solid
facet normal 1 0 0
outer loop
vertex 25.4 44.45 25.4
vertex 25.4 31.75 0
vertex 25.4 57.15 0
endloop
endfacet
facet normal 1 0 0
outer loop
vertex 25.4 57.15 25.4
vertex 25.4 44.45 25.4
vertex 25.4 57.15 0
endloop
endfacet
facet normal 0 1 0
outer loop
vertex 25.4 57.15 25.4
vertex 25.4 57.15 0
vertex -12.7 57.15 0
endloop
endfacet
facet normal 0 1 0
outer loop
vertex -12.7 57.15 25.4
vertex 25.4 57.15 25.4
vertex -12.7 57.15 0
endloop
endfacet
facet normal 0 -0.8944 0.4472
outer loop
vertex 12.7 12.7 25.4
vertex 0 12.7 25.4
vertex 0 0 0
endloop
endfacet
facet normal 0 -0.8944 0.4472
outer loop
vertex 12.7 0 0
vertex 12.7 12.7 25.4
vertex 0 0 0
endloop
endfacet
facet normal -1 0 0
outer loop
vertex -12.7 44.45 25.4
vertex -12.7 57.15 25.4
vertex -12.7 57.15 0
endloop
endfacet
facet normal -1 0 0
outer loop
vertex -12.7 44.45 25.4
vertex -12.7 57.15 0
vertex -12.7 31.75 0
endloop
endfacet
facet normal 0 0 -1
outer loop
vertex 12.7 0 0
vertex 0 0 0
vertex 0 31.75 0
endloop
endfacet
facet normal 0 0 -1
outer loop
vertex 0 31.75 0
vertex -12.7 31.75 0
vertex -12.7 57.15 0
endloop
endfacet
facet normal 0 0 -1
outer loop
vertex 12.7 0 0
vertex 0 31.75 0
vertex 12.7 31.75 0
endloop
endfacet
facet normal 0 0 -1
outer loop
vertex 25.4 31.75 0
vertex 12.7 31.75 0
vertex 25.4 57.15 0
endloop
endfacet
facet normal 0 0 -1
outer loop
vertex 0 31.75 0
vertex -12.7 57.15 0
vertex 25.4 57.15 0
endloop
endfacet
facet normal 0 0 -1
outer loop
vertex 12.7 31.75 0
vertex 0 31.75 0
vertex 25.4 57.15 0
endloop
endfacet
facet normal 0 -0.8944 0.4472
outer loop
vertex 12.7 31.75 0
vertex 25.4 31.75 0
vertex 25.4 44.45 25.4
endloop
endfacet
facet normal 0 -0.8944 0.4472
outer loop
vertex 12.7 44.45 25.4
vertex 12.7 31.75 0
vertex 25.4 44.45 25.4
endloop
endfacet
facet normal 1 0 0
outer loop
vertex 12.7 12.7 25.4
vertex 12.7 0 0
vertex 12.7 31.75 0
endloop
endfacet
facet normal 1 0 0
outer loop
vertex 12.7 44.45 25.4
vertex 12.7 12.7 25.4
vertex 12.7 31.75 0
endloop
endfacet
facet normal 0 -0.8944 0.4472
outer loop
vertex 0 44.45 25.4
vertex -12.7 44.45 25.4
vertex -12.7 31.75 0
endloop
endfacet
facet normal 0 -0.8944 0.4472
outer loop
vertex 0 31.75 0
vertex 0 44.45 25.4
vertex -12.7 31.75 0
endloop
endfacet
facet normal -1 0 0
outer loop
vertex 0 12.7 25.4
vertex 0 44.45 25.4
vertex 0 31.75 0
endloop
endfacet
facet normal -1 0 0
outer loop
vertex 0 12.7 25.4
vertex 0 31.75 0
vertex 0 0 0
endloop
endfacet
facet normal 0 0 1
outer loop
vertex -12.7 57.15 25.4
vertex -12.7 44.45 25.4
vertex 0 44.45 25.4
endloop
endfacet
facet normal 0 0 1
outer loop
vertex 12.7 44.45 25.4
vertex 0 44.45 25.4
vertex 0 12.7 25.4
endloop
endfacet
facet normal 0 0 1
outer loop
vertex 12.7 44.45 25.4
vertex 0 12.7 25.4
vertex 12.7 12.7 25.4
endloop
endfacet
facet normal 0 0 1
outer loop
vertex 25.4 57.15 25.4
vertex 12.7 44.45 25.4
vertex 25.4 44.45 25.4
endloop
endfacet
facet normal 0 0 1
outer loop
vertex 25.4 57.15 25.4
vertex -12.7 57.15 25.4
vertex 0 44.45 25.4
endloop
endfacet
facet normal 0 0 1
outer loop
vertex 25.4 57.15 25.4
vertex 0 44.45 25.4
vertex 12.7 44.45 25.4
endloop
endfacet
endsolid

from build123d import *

# Parameters (mm, degrees)
F1_DEPTH = 25.4
F3_DEPTH = 12.7
F5_DEPTH = 12.7
F7_DEPTH = 12.7


with BuildPart() as f1:
    # F0 (on Top) → F1 (new body)
    with BuildSketch(Plane.XY):
        Polygon((-12.7, 31.75), (0, 31.75), (0, 0), (12.7, 0), (12.7, 31.75), (25.4, 31.75), (25.4, 57.15), (-12.7, 57.15), align=None)
    extrude(amount=F1_DEPTH)

    # F2 (on face) → F3 (cut)
    with BuildSketch(Plane(origin=(-12.7, 0, 0), x_dir=(0, -1, 0), z_dir=(-1, 0, 0))):
        Polygon((-31.75, 25.4), (-44.45, 25.4), (-31.75, 0), align=None)
    extrude(amount=-F3_DEPTH, mode=Mode.SUBTRACT)

    # F4 (on face) → F5 (cut)
    with BuildSketch(Plane.YZ.offset(25.4)):
        Polygon((31.75, 0), (44.45, 25.4), (31.75, 25.4), align=None)
    extrude(amount=-F5_DEPTH, mode=Mode.SUBTRACT)

    # F6 (on face) → F7 (cut)
    with BuildSketch(Plane(origin=(0, 0, 0), x_dir=(0, -1, 0), z_dir=(-1, 0, 0))):
        Polygon((0, 25.4), (-12.7, 25.4), (0, 0), align=None)
    extrude(amount=-F7_DEPTH, mode=Mode.SUBTRACT)


solid = f1.part
